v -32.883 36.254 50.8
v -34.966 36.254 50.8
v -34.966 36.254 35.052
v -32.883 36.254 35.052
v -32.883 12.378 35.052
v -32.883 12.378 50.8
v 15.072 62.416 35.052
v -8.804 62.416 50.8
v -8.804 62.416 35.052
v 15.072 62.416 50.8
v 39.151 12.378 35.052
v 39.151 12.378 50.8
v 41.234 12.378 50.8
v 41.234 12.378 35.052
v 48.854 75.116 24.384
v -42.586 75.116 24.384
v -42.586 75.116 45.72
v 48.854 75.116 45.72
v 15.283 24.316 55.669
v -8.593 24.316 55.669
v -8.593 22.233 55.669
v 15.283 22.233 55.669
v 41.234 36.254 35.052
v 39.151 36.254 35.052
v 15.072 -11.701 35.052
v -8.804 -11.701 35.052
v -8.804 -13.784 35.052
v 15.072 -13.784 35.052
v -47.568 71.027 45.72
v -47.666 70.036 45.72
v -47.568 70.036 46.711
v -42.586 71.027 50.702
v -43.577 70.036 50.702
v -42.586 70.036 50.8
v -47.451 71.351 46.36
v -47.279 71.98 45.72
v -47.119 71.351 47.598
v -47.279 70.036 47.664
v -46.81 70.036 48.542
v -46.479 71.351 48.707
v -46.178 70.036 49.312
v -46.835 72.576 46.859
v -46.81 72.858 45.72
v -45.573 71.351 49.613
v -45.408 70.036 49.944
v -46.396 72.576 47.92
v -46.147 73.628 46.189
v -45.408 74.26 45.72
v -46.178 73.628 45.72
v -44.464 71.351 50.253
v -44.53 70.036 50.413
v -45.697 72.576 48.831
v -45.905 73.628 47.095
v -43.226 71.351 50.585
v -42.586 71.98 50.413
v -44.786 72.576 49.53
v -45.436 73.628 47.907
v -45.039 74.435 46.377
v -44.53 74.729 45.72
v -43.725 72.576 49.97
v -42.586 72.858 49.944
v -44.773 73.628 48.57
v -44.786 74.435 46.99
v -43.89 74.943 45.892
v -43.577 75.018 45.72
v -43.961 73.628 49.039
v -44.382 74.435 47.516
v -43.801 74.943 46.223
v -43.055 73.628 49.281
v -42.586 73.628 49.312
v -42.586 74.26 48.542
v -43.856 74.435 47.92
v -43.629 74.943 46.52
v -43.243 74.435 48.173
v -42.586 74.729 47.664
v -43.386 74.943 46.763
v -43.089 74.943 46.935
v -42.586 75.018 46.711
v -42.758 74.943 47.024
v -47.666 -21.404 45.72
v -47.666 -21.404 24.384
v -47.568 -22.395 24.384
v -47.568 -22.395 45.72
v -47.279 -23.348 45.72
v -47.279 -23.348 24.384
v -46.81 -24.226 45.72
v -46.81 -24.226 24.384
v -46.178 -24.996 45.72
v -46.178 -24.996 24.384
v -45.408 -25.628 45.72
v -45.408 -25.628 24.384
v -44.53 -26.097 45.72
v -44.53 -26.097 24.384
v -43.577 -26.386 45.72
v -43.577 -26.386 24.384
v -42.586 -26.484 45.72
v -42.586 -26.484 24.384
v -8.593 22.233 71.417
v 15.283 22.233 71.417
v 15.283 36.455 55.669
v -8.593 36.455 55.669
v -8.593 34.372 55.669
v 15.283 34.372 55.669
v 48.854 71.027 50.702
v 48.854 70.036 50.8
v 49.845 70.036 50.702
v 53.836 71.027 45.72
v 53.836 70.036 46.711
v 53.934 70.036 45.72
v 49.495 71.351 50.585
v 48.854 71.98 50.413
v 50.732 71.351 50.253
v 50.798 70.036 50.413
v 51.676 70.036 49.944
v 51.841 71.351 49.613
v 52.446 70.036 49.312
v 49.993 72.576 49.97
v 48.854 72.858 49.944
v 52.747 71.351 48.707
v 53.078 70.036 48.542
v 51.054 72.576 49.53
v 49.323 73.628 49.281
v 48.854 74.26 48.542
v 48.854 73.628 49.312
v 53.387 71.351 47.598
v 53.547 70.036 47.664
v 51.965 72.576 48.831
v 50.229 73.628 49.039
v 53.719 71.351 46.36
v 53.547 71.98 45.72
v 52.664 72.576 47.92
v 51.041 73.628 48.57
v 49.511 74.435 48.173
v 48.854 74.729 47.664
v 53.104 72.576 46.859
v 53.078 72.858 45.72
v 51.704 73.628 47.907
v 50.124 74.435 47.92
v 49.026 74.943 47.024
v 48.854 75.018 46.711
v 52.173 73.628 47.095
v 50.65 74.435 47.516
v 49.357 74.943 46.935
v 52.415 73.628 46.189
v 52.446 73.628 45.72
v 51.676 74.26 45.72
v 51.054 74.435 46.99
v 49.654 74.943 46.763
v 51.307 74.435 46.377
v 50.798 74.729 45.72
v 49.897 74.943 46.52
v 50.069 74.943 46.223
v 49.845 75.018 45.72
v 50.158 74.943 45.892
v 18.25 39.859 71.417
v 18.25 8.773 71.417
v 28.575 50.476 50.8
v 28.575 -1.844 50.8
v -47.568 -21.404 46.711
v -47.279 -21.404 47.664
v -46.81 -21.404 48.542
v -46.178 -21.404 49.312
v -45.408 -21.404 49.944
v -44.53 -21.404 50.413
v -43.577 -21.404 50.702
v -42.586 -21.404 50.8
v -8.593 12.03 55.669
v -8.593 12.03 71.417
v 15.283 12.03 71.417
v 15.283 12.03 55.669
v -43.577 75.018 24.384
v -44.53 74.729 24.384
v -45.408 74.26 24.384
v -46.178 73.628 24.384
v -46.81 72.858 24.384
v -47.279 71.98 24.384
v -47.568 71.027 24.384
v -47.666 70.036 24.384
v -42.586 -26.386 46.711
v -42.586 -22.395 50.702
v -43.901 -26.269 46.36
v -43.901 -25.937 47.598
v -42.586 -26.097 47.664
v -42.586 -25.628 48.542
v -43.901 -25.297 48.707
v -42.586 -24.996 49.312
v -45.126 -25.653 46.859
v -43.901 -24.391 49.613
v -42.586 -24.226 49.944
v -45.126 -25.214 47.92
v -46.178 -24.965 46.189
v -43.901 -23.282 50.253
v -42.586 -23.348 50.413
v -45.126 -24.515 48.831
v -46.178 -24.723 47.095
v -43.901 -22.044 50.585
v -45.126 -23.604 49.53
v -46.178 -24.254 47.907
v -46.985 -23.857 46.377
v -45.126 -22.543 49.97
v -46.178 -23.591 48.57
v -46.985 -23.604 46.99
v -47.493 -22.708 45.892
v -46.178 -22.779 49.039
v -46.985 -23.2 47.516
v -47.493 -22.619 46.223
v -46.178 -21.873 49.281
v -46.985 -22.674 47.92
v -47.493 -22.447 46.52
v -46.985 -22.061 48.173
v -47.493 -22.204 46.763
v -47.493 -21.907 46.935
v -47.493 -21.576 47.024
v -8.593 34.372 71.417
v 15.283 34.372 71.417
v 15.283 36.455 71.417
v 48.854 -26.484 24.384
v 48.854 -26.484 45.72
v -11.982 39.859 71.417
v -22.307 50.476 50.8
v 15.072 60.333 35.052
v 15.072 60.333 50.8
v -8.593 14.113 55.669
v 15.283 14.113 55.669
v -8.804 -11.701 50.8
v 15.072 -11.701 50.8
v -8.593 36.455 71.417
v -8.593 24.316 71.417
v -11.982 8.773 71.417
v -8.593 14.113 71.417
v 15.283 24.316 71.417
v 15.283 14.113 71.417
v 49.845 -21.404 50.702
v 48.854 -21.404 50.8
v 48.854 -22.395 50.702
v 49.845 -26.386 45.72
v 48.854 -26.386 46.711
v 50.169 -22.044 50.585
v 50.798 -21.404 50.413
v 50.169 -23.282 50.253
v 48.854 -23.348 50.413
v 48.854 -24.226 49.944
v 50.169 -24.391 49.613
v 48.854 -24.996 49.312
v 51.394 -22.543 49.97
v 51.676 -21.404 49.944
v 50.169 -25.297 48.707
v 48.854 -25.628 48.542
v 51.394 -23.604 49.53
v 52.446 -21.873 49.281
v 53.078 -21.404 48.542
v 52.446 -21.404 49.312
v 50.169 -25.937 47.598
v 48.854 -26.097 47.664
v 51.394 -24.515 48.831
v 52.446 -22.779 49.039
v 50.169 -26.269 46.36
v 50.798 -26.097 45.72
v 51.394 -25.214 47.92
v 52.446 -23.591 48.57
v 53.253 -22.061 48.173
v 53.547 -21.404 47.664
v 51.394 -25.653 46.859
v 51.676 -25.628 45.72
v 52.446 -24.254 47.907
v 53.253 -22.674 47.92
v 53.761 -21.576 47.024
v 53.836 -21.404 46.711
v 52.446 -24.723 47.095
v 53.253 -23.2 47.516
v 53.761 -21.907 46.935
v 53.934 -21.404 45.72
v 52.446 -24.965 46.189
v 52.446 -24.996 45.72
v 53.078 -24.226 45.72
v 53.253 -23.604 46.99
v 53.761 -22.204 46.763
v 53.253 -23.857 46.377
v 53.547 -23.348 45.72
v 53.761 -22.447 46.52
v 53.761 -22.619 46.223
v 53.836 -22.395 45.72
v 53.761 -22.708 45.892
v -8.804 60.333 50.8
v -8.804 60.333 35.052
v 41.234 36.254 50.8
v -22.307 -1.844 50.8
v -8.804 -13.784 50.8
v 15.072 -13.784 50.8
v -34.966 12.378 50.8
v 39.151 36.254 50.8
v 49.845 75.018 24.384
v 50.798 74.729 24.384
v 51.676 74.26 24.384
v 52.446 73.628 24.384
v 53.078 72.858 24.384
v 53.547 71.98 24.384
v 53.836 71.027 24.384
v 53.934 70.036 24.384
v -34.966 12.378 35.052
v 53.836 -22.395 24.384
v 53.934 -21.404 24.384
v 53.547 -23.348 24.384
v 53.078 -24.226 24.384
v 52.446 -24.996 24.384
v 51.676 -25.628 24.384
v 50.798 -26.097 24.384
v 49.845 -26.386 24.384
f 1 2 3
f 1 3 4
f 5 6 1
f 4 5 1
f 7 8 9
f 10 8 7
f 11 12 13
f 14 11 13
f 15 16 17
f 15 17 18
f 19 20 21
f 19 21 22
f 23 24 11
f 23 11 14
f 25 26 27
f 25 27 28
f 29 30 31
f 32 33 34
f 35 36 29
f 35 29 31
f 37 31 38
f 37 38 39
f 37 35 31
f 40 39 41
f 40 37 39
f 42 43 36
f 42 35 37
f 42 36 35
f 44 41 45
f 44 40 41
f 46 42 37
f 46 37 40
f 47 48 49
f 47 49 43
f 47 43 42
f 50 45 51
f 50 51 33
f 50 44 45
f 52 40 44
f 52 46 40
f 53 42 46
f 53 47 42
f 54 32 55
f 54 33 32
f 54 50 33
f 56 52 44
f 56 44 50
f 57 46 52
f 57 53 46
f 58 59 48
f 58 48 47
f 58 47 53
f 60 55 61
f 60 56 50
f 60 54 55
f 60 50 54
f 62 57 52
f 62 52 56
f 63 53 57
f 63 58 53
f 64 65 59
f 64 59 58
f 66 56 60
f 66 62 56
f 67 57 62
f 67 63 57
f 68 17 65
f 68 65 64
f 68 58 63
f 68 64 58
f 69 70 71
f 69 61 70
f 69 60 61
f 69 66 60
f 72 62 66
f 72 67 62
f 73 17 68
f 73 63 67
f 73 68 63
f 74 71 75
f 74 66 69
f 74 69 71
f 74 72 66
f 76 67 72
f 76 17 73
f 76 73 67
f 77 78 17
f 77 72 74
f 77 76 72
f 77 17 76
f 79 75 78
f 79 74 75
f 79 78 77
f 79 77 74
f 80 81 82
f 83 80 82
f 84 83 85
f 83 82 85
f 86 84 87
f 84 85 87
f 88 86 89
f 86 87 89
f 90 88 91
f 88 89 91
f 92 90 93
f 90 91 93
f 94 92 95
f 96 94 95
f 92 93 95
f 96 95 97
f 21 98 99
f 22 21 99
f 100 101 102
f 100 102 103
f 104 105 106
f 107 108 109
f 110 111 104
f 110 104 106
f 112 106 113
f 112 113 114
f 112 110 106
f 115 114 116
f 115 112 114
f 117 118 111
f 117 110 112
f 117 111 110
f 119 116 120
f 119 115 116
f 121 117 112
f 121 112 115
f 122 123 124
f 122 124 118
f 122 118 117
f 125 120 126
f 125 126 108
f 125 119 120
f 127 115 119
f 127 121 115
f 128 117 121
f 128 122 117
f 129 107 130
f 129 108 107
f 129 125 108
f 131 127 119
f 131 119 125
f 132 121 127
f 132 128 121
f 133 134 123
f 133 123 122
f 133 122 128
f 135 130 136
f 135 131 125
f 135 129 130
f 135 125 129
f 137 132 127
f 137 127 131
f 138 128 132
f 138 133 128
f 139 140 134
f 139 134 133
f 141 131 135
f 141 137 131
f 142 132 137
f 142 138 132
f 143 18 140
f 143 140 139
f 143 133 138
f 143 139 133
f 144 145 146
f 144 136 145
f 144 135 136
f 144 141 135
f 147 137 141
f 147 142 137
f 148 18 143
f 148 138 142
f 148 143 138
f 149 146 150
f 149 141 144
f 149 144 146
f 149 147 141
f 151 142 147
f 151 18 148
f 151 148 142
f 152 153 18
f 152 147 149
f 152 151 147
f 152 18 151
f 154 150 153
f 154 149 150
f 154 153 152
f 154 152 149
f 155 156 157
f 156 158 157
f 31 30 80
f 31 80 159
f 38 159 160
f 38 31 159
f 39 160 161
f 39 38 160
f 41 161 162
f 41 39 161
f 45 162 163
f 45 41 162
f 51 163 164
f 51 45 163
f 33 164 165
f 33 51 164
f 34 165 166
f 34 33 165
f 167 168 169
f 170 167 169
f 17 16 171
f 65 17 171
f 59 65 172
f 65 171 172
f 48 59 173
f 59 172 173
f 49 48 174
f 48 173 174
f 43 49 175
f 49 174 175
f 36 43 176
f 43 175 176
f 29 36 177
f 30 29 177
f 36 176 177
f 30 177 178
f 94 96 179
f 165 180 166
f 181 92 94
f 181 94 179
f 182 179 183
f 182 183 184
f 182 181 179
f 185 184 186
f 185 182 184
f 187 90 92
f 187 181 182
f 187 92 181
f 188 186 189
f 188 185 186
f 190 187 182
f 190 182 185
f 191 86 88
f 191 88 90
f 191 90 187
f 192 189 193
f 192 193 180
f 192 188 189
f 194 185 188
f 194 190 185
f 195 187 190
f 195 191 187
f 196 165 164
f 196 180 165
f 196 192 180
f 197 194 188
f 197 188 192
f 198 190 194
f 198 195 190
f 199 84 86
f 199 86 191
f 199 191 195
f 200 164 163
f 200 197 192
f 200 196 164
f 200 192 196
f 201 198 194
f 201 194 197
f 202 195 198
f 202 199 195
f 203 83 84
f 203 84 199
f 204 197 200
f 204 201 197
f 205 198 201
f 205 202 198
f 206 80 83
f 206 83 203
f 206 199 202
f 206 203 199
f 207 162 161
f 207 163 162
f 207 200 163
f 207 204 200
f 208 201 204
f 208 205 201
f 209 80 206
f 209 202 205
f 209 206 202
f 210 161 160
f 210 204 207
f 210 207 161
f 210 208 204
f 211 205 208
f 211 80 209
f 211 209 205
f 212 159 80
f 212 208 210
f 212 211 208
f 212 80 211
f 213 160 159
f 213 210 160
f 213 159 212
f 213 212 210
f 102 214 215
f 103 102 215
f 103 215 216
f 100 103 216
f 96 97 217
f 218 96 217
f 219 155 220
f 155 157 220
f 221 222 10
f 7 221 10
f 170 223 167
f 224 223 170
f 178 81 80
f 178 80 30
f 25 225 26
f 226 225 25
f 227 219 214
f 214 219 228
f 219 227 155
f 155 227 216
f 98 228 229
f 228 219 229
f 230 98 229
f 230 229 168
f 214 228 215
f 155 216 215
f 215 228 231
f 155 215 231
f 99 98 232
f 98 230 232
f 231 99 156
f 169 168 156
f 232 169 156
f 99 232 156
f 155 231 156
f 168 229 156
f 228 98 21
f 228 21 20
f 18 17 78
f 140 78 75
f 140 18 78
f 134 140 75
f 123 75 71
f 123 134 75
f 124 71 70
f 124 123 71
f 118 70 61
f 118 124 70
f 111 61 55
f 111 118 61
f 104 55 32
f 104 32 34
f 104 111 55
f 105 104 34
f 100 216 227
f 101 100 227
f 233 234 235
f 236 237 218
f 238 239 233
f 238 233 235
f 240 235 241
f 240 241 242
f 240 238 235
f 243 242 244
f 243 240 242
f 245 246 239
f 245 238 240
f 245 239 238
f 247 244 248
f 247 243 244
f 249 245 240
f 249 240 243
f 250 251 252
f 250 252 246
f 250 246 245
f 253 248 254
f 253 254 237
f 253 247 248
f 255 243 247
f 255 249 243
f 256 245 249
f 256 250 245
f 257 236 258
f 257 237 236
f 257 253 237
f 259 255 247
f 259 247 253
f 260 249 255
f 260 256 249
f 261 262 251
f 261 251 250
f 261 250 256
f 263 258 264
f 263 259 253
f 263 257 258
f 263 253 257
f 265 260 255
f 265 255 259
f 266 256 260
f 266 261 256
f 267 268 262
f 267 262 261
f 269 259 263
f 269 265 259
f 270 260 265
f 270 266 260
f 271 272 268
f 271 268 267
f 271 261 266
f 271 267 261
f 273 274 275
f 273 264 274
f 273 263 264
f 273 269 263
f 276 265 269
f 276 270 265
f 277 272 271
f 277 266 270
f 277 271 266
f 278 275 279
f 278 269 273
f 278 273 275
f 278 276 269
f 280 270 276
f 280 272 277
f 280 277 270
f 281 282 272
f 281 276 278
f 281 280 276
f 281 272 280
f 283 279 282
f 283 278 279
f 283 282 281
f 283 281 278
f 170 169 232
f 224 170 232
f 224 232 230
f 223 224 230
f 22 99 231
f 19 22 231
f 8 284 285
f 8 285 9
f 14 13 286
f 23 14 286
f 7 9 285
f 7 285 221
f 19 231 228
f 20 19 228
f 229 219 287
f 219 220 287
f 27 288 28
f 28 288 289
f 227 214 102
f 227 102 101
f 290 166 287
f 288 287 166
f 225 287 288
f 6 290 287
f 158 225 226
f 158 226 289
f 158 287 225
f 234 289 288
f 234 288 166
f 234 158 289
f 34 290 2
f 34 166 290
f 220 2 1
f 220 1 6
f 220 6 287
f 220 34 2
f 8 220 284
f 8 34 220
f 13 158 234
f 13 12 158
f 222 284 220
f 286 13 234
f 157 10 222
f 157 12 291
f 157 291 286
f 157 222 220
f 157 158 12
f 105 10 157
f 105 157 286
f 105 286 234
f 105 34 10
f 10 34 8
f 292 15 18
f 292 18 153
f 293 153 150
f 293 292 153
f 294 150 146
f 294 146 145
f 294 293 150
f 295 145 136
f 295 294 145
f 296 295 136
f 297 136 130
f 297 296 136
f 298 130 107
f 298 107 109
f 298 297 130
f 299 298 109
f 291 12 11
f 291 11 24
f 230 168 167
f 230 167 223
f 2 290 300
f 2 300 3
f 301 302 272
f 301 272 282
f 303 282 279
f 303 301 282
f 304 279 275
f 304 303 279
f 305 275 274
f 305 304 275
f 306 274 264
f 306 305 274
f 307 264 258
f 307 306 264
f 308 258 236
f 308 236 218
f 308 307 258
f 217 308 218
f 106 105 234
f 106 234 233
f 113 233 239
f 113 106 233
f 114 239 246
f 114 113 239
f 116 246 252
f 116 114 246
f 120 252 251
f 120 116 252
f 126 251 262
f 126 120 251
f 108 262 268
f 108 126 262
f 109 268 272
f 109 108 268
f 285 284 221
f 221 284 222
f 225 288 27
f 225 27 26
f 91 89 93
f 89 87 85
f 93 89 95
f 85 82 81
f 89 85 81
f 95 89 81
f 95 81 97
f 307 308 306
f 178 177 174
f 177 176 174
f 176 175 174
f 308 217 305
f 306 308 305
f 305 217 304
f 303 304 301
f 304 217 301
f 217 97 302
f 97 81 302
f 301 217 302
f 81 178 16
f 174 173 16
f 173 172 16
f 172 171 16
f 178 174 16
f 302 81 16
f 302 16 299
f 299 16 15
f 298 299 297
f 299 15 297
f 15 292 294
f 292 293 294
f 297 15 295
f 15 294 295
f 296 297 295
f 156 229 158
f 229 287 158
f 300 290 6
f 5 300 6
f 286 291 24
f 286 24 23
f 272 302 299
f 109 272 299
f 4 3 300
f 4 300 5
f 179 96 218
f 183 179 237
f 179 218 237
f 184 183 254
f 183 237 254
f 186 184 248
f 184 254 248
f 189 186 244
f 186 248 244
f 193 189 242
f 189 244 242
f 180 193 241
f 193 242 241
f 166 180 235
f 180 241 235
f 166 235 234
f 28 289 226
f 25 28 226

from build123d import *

# Parameters (mm, degrees)
F0_W         = 101.6
F0_H         = 101.6
F1_DEPTH     = 50.8
F2_W         = 50.8819408715
F2_H         = 52.3191291059
F6_R         = 5.08
F7_T1_DEPTH  = 58.42
F7_S5_W      = 5.08
F7_S5_H      = 5.08
F7_T6_DEPTH  = 5.08
F7_S11_W     = 5.08
F7_S11_H     = 5.08
F7_T12_DEPTH = 5.08
F7_S17_W     = 5.08
F7_S17_H     = 5.08
F7_T18_DEPTH = 5.08
F7_S23_W     = 5.08
F7_S23_H     = 5.08
F7_T24_DEPTH = 5.08
F8_W         = 36.9938705117
F8_H         = 32.6922610402
F9_DEPTH     = 43.434
F10_W        = 2.0828
F10_H        = 23.876
F10_W_2      = 23.876
F10_H_2      = 2.0828
F11_DEPTH    = 15.748
F12_W        = 11.7269940674
F12_H        = 2.0828
F12_W_2      = 12.1490059326
F13_DEPTH    = 15.748
F14_DEPTH    = 24.384


# Not quite as in the source:
# - a fillet or chamfer that OpenCascade refuses, or shapes differently, is made with other operations: its cross-section is extruded or revolved along the edge and cut away or added


with BuildPart() as f1:
    # F0 (on Top) → F1 (new body)
    with BuildSketch(Plane.XY):
        with Locations((3.134034574, 24.3160160567)):
            Rectangle(F0_W, F0_H)
    extrude(amount=F1_DEPTH)

    # F2 (on face) → F5 section 0
    with BuildSketch(Plane.XY.offset(50.8), mode=Mode.PRIVATE) as f5_s0:
        with Locations((3.134034574, 24.3160160567)):
            Rectangle(F2_W, F2_H)
    loft([Vertex(3.134034574, 24.3160160567, 101.6), f5_s0.sketch])

    # F6
    f6_edges = [f1.edges().sort_by_distance(p)[0] for p in [
        (3.134035, -26.483984, 50.8),
        (-47.665965, 24.316016, 50.8),
        (3.134035, 75.116016, 50.8),
        (53.934035, 24.316016, 50.8),
    ]]
    fillet(f6_edges, radius=F6_R)

    # F7: fillet of radius 5.08 on 4 edges, made by hand

    # F7_s2 → F7_t1 (cut)
    with BuildSketch(Plane.XY.offset(-12.7)):
        with BuildLine():
            ThreePointArc((-42.585965426, 75.1160160567), (-46.1780678744, 73.6281185051), (-47.665965426, 70.0360160567))
            Line((-47.665965426, 70.0360160567), (-47.665965426, 75.1160160567))
            Line((-47.665965426, 75.1160160567), (-42.585965426, 75.1160160567))
        make_face()
        with BuildLine():
            ThreePointArc((-47.665965426, -21.4039839433), (-46.1780678744, -24.9960863917), (-42.585965426, -26.4839839433))
            Line((-42.585965426, -26.4839839433), (-47.665965426, -26.4839839433))
            Line((-47.665965426, -26.4839839433), (-47.665965426, -21.4039839433))
        make_face()
        with BuildLine():
            ThreePointArc((53.934034574, -21.4039839433), (52.4461370225, -24.9960863917), (48.854034574, -26.4839839433))
            Line((48.854034574, -26.4839839433), (53.934034574, -26.4839839433))
            Line((53.934034574, -26.4839839433), (53.934034574, -21.4039839433))
        make_face()
        with BuildLine():
            ThreePointArc((48.854034574, 75.1160160567), (52.4461370225, 73.6281185051), (53.934034574, 70.0360160567))
            Line((53.934034574, 70.0360160567), (53.934034574, 75.1160160567))
            Line((53.934034574, 75.1160160567), (48.854034574, 75.1160160567))
        make_face()
    extrude(amount=F7_T1_DEPTH, mode=Mode.SUBTRACT)


with BuildPart() as f7_tool4:
    # F7_s5 → F7_t6 (new body)
    with BuildSketch(Plane.XZ.offset(-70.0360160567)):
        with Locations((51.394034574, 48.26)):
            Rectangle(F7_S5_W, F7_S5_H)
    extrude(amount=-F7_T6_DEPTH)

    # F7_s7 → F7_t8 (revolve, cut)
    with BuildSketch(Plane(origin=(48.854034574, 70.0360160567, 45.72), x_dir=(-0.7071067812, 0, -0.7071067812), z_dir=(0.7071067812, 0, -0.7071067812))):
        with BuildLine():
            ThreePointArc((0, -5.08), (5.08, 0), (0, 5.08))
            Line((0, 5.08), (0, -5.08))
        make_face()
    revolve(axis=Axis((48.854034574, 70.0360160567, 45.72), (0, 1, 0)), mode=Mode.SUBTRACT)


with BuildPart() as f1_1:
    add(f1.part)

    # F7_t3: cut F7_tool4
    add(f7_tool4.part, mode=Mode.SUBTRACT)


with BuildPart() as f7_tool10:
    # F7_s11 → F7_t12 (new body)
    with BuildSketch(Plane.YZ.offset(48.854034574)):
        with Locations((-23.9439839433, 48.26)):
            Rectangle(F7_S11_W, F7_S11_H)
    extrude(amount=F7_T12_DEPTH)

    # F7_s13 → F7_t14 (revolve, cut)
    with BuildSketch(Plane(origin=(48.854034574, -21.4039839433, 45.72), x_dir=(0, 0.7071067812, -0.7071067812), z_dir=(0, -0.7071067812, -0.7071067812))):
        with BuildLine():
            ThreePointArc((0, -5.08), (5.08, 0), (0, 5.08))
            Line((0, 5.08), (0, -5.08))
        make_face()
    revolve(axis=Axis((48.854034574, -21.4039839433, 45.72), (1, 0, 0)), mode=Mode.SUBTRACT)


with BuildPart() as f1_2:
    add(f1_1.part)

    # F7_t9: cut F7_tool10
    add(f7_tool10.part, mode=Mode.SUBTRACT)


with BuildPart() as f7_tool16:
    # F7_s17 → F7_t18 (new body)
    with BuildSketch(Plane.YZ.offset(-42.585965426)):
        with Locations((-23.9439839433, 48.26)):
            Rectangle(F7_S17_W, F7_S17_H)
    extrude(amount=-F7_T18_DEPTH)

    # F7_s19 → F7_t20 (revolve, cut)
    with BuildSketch(Plane(origin=(-42.585965426, -21.4039839433, 45.72), x_dir=(0, 0.7071067812, -0.7071067812), z_dir=(0, 0.7071067812, 0.7071067812))):
        with BuildLine():
            ThreePointArc((0, -5.08), (5.08, 0), (0, 5.08))
            Line((0, 5.08), (0, -5.08))
        make_face()
    revolve(axis=Axis((-42.585965426, -21.4039839433, 45.72), (-1, 0, 0)), mode=Mode.SUBTRACT)


with BuildPart() as f1_3:
    add(f1_2.part)

    # F7_t15: cut F7_tool16
    add(f7_tool16.part, mode=Mode.SUBTRACT)


with BuildPart() as f7_tool22:
    # F7_s23 → F7_t24 (new body)
    with BuildSketch(Plane.XZ.offset(-70.0360160567)):
        with Locations((-45.125965426, 48.26)):
            Rectangle(F7_S23_W, F7_S23_H)
    extrude(amount=-F7_T24_DEPTH)

    # F7_s25 → F7_t26 (revolve, cut)
    with BuildSketch(Plane(origin=(-42.585965426, 70.0360160567, 45.72), x_dir=(0.7071067812, 0, -0.7071067812), z_dir=(0.7071067812, 0, 0.7071067812))):
        with BuildLine():
            ThreePointArc((0, -5.08), (5.08, 0), (0, 5.08))
            Line((0, 5.08), (0, -5.08))
        make_face()
    revolve(axis=Axis((-42.585965426, 70.0360160567, 45.72), (0, 1, 0)), mode=Mode.SUBTRACT)


with BuildPart() as f1_4:
    add(f1_3.part)

    # F7_t21: cut F7_tool22
    add(f7_tool22.part, mode=Mode.SUBTRACT)

    # F8 (on Front) → F9 (cut)
    with BuildSketch(Plane.XZ):
        with Locations((2.3658862337, 87.7631418407)):
            Rectangle(F8_W, F8_H)
    extrude(amount=-F9_DEPTH, mode=Mode.SUBTRACT)

    # F10 (on face) → F11 (cut)
    with BuildSketch(Plane.XY.offset(50.8)):
        with Locations((-33.924565426, 24.3160160567)):
            Rectangle(F10_W, F10_H)
        with Locations((3.134034574, 61.3746160567)):
            Rectangle(F10_W_2, F10_H_2)
        with Locations((40.192634574, 24.3160160567)):
            Rectangle(F10_W, F10_H)
        with Locations((3.134034574, -12.7425839433)):
            Rectangle(F10_W_2, F10_H_2)
    extrude(amount=-F11_DEPTH, mode=Mode.SUBTRACT)

    # F12 (on face) → F13 (cut)
    with BuildSketch(Plane.XY.offset(71.4170113206)):
        with Locations((-2.7294624597, 35.4132379736)):
            Rectangle(F12_W, F12_H)
        with Locations((9.2085375403, 35.4132379736)):
            Rectangle(F12_W_2, F12_H)
        with Locations((9.2085375403, 13.0715451534)):
            Rectangle(F12_W_2, F12_H)
        with Locations((-2.7294624597, 13.0715451534)):
            Rectangle(F12_W, F12_H)
        with Locations((-2.7294624597, 23.2746160567)):
            Rectangle(F12_W, F12_H)
        with Locations((9.2085375403, 23.2746160567)):
            Rectangle(F12_W_2, F12_H)
    extrude(amount=-F13_DEPTH, mode=Mode.SUBTRACT)

    # F0 (on Top) → F14 (cut)
    with BuildSketch(Plane.XY):
        with Locations((3.134034574, 24.3160160567)):
            Rectangle(F0_W, F0_H)
    extrude(amount=F14_DEPTH, mode=Mode.SUBTRACT)


solid = f1_4.part
